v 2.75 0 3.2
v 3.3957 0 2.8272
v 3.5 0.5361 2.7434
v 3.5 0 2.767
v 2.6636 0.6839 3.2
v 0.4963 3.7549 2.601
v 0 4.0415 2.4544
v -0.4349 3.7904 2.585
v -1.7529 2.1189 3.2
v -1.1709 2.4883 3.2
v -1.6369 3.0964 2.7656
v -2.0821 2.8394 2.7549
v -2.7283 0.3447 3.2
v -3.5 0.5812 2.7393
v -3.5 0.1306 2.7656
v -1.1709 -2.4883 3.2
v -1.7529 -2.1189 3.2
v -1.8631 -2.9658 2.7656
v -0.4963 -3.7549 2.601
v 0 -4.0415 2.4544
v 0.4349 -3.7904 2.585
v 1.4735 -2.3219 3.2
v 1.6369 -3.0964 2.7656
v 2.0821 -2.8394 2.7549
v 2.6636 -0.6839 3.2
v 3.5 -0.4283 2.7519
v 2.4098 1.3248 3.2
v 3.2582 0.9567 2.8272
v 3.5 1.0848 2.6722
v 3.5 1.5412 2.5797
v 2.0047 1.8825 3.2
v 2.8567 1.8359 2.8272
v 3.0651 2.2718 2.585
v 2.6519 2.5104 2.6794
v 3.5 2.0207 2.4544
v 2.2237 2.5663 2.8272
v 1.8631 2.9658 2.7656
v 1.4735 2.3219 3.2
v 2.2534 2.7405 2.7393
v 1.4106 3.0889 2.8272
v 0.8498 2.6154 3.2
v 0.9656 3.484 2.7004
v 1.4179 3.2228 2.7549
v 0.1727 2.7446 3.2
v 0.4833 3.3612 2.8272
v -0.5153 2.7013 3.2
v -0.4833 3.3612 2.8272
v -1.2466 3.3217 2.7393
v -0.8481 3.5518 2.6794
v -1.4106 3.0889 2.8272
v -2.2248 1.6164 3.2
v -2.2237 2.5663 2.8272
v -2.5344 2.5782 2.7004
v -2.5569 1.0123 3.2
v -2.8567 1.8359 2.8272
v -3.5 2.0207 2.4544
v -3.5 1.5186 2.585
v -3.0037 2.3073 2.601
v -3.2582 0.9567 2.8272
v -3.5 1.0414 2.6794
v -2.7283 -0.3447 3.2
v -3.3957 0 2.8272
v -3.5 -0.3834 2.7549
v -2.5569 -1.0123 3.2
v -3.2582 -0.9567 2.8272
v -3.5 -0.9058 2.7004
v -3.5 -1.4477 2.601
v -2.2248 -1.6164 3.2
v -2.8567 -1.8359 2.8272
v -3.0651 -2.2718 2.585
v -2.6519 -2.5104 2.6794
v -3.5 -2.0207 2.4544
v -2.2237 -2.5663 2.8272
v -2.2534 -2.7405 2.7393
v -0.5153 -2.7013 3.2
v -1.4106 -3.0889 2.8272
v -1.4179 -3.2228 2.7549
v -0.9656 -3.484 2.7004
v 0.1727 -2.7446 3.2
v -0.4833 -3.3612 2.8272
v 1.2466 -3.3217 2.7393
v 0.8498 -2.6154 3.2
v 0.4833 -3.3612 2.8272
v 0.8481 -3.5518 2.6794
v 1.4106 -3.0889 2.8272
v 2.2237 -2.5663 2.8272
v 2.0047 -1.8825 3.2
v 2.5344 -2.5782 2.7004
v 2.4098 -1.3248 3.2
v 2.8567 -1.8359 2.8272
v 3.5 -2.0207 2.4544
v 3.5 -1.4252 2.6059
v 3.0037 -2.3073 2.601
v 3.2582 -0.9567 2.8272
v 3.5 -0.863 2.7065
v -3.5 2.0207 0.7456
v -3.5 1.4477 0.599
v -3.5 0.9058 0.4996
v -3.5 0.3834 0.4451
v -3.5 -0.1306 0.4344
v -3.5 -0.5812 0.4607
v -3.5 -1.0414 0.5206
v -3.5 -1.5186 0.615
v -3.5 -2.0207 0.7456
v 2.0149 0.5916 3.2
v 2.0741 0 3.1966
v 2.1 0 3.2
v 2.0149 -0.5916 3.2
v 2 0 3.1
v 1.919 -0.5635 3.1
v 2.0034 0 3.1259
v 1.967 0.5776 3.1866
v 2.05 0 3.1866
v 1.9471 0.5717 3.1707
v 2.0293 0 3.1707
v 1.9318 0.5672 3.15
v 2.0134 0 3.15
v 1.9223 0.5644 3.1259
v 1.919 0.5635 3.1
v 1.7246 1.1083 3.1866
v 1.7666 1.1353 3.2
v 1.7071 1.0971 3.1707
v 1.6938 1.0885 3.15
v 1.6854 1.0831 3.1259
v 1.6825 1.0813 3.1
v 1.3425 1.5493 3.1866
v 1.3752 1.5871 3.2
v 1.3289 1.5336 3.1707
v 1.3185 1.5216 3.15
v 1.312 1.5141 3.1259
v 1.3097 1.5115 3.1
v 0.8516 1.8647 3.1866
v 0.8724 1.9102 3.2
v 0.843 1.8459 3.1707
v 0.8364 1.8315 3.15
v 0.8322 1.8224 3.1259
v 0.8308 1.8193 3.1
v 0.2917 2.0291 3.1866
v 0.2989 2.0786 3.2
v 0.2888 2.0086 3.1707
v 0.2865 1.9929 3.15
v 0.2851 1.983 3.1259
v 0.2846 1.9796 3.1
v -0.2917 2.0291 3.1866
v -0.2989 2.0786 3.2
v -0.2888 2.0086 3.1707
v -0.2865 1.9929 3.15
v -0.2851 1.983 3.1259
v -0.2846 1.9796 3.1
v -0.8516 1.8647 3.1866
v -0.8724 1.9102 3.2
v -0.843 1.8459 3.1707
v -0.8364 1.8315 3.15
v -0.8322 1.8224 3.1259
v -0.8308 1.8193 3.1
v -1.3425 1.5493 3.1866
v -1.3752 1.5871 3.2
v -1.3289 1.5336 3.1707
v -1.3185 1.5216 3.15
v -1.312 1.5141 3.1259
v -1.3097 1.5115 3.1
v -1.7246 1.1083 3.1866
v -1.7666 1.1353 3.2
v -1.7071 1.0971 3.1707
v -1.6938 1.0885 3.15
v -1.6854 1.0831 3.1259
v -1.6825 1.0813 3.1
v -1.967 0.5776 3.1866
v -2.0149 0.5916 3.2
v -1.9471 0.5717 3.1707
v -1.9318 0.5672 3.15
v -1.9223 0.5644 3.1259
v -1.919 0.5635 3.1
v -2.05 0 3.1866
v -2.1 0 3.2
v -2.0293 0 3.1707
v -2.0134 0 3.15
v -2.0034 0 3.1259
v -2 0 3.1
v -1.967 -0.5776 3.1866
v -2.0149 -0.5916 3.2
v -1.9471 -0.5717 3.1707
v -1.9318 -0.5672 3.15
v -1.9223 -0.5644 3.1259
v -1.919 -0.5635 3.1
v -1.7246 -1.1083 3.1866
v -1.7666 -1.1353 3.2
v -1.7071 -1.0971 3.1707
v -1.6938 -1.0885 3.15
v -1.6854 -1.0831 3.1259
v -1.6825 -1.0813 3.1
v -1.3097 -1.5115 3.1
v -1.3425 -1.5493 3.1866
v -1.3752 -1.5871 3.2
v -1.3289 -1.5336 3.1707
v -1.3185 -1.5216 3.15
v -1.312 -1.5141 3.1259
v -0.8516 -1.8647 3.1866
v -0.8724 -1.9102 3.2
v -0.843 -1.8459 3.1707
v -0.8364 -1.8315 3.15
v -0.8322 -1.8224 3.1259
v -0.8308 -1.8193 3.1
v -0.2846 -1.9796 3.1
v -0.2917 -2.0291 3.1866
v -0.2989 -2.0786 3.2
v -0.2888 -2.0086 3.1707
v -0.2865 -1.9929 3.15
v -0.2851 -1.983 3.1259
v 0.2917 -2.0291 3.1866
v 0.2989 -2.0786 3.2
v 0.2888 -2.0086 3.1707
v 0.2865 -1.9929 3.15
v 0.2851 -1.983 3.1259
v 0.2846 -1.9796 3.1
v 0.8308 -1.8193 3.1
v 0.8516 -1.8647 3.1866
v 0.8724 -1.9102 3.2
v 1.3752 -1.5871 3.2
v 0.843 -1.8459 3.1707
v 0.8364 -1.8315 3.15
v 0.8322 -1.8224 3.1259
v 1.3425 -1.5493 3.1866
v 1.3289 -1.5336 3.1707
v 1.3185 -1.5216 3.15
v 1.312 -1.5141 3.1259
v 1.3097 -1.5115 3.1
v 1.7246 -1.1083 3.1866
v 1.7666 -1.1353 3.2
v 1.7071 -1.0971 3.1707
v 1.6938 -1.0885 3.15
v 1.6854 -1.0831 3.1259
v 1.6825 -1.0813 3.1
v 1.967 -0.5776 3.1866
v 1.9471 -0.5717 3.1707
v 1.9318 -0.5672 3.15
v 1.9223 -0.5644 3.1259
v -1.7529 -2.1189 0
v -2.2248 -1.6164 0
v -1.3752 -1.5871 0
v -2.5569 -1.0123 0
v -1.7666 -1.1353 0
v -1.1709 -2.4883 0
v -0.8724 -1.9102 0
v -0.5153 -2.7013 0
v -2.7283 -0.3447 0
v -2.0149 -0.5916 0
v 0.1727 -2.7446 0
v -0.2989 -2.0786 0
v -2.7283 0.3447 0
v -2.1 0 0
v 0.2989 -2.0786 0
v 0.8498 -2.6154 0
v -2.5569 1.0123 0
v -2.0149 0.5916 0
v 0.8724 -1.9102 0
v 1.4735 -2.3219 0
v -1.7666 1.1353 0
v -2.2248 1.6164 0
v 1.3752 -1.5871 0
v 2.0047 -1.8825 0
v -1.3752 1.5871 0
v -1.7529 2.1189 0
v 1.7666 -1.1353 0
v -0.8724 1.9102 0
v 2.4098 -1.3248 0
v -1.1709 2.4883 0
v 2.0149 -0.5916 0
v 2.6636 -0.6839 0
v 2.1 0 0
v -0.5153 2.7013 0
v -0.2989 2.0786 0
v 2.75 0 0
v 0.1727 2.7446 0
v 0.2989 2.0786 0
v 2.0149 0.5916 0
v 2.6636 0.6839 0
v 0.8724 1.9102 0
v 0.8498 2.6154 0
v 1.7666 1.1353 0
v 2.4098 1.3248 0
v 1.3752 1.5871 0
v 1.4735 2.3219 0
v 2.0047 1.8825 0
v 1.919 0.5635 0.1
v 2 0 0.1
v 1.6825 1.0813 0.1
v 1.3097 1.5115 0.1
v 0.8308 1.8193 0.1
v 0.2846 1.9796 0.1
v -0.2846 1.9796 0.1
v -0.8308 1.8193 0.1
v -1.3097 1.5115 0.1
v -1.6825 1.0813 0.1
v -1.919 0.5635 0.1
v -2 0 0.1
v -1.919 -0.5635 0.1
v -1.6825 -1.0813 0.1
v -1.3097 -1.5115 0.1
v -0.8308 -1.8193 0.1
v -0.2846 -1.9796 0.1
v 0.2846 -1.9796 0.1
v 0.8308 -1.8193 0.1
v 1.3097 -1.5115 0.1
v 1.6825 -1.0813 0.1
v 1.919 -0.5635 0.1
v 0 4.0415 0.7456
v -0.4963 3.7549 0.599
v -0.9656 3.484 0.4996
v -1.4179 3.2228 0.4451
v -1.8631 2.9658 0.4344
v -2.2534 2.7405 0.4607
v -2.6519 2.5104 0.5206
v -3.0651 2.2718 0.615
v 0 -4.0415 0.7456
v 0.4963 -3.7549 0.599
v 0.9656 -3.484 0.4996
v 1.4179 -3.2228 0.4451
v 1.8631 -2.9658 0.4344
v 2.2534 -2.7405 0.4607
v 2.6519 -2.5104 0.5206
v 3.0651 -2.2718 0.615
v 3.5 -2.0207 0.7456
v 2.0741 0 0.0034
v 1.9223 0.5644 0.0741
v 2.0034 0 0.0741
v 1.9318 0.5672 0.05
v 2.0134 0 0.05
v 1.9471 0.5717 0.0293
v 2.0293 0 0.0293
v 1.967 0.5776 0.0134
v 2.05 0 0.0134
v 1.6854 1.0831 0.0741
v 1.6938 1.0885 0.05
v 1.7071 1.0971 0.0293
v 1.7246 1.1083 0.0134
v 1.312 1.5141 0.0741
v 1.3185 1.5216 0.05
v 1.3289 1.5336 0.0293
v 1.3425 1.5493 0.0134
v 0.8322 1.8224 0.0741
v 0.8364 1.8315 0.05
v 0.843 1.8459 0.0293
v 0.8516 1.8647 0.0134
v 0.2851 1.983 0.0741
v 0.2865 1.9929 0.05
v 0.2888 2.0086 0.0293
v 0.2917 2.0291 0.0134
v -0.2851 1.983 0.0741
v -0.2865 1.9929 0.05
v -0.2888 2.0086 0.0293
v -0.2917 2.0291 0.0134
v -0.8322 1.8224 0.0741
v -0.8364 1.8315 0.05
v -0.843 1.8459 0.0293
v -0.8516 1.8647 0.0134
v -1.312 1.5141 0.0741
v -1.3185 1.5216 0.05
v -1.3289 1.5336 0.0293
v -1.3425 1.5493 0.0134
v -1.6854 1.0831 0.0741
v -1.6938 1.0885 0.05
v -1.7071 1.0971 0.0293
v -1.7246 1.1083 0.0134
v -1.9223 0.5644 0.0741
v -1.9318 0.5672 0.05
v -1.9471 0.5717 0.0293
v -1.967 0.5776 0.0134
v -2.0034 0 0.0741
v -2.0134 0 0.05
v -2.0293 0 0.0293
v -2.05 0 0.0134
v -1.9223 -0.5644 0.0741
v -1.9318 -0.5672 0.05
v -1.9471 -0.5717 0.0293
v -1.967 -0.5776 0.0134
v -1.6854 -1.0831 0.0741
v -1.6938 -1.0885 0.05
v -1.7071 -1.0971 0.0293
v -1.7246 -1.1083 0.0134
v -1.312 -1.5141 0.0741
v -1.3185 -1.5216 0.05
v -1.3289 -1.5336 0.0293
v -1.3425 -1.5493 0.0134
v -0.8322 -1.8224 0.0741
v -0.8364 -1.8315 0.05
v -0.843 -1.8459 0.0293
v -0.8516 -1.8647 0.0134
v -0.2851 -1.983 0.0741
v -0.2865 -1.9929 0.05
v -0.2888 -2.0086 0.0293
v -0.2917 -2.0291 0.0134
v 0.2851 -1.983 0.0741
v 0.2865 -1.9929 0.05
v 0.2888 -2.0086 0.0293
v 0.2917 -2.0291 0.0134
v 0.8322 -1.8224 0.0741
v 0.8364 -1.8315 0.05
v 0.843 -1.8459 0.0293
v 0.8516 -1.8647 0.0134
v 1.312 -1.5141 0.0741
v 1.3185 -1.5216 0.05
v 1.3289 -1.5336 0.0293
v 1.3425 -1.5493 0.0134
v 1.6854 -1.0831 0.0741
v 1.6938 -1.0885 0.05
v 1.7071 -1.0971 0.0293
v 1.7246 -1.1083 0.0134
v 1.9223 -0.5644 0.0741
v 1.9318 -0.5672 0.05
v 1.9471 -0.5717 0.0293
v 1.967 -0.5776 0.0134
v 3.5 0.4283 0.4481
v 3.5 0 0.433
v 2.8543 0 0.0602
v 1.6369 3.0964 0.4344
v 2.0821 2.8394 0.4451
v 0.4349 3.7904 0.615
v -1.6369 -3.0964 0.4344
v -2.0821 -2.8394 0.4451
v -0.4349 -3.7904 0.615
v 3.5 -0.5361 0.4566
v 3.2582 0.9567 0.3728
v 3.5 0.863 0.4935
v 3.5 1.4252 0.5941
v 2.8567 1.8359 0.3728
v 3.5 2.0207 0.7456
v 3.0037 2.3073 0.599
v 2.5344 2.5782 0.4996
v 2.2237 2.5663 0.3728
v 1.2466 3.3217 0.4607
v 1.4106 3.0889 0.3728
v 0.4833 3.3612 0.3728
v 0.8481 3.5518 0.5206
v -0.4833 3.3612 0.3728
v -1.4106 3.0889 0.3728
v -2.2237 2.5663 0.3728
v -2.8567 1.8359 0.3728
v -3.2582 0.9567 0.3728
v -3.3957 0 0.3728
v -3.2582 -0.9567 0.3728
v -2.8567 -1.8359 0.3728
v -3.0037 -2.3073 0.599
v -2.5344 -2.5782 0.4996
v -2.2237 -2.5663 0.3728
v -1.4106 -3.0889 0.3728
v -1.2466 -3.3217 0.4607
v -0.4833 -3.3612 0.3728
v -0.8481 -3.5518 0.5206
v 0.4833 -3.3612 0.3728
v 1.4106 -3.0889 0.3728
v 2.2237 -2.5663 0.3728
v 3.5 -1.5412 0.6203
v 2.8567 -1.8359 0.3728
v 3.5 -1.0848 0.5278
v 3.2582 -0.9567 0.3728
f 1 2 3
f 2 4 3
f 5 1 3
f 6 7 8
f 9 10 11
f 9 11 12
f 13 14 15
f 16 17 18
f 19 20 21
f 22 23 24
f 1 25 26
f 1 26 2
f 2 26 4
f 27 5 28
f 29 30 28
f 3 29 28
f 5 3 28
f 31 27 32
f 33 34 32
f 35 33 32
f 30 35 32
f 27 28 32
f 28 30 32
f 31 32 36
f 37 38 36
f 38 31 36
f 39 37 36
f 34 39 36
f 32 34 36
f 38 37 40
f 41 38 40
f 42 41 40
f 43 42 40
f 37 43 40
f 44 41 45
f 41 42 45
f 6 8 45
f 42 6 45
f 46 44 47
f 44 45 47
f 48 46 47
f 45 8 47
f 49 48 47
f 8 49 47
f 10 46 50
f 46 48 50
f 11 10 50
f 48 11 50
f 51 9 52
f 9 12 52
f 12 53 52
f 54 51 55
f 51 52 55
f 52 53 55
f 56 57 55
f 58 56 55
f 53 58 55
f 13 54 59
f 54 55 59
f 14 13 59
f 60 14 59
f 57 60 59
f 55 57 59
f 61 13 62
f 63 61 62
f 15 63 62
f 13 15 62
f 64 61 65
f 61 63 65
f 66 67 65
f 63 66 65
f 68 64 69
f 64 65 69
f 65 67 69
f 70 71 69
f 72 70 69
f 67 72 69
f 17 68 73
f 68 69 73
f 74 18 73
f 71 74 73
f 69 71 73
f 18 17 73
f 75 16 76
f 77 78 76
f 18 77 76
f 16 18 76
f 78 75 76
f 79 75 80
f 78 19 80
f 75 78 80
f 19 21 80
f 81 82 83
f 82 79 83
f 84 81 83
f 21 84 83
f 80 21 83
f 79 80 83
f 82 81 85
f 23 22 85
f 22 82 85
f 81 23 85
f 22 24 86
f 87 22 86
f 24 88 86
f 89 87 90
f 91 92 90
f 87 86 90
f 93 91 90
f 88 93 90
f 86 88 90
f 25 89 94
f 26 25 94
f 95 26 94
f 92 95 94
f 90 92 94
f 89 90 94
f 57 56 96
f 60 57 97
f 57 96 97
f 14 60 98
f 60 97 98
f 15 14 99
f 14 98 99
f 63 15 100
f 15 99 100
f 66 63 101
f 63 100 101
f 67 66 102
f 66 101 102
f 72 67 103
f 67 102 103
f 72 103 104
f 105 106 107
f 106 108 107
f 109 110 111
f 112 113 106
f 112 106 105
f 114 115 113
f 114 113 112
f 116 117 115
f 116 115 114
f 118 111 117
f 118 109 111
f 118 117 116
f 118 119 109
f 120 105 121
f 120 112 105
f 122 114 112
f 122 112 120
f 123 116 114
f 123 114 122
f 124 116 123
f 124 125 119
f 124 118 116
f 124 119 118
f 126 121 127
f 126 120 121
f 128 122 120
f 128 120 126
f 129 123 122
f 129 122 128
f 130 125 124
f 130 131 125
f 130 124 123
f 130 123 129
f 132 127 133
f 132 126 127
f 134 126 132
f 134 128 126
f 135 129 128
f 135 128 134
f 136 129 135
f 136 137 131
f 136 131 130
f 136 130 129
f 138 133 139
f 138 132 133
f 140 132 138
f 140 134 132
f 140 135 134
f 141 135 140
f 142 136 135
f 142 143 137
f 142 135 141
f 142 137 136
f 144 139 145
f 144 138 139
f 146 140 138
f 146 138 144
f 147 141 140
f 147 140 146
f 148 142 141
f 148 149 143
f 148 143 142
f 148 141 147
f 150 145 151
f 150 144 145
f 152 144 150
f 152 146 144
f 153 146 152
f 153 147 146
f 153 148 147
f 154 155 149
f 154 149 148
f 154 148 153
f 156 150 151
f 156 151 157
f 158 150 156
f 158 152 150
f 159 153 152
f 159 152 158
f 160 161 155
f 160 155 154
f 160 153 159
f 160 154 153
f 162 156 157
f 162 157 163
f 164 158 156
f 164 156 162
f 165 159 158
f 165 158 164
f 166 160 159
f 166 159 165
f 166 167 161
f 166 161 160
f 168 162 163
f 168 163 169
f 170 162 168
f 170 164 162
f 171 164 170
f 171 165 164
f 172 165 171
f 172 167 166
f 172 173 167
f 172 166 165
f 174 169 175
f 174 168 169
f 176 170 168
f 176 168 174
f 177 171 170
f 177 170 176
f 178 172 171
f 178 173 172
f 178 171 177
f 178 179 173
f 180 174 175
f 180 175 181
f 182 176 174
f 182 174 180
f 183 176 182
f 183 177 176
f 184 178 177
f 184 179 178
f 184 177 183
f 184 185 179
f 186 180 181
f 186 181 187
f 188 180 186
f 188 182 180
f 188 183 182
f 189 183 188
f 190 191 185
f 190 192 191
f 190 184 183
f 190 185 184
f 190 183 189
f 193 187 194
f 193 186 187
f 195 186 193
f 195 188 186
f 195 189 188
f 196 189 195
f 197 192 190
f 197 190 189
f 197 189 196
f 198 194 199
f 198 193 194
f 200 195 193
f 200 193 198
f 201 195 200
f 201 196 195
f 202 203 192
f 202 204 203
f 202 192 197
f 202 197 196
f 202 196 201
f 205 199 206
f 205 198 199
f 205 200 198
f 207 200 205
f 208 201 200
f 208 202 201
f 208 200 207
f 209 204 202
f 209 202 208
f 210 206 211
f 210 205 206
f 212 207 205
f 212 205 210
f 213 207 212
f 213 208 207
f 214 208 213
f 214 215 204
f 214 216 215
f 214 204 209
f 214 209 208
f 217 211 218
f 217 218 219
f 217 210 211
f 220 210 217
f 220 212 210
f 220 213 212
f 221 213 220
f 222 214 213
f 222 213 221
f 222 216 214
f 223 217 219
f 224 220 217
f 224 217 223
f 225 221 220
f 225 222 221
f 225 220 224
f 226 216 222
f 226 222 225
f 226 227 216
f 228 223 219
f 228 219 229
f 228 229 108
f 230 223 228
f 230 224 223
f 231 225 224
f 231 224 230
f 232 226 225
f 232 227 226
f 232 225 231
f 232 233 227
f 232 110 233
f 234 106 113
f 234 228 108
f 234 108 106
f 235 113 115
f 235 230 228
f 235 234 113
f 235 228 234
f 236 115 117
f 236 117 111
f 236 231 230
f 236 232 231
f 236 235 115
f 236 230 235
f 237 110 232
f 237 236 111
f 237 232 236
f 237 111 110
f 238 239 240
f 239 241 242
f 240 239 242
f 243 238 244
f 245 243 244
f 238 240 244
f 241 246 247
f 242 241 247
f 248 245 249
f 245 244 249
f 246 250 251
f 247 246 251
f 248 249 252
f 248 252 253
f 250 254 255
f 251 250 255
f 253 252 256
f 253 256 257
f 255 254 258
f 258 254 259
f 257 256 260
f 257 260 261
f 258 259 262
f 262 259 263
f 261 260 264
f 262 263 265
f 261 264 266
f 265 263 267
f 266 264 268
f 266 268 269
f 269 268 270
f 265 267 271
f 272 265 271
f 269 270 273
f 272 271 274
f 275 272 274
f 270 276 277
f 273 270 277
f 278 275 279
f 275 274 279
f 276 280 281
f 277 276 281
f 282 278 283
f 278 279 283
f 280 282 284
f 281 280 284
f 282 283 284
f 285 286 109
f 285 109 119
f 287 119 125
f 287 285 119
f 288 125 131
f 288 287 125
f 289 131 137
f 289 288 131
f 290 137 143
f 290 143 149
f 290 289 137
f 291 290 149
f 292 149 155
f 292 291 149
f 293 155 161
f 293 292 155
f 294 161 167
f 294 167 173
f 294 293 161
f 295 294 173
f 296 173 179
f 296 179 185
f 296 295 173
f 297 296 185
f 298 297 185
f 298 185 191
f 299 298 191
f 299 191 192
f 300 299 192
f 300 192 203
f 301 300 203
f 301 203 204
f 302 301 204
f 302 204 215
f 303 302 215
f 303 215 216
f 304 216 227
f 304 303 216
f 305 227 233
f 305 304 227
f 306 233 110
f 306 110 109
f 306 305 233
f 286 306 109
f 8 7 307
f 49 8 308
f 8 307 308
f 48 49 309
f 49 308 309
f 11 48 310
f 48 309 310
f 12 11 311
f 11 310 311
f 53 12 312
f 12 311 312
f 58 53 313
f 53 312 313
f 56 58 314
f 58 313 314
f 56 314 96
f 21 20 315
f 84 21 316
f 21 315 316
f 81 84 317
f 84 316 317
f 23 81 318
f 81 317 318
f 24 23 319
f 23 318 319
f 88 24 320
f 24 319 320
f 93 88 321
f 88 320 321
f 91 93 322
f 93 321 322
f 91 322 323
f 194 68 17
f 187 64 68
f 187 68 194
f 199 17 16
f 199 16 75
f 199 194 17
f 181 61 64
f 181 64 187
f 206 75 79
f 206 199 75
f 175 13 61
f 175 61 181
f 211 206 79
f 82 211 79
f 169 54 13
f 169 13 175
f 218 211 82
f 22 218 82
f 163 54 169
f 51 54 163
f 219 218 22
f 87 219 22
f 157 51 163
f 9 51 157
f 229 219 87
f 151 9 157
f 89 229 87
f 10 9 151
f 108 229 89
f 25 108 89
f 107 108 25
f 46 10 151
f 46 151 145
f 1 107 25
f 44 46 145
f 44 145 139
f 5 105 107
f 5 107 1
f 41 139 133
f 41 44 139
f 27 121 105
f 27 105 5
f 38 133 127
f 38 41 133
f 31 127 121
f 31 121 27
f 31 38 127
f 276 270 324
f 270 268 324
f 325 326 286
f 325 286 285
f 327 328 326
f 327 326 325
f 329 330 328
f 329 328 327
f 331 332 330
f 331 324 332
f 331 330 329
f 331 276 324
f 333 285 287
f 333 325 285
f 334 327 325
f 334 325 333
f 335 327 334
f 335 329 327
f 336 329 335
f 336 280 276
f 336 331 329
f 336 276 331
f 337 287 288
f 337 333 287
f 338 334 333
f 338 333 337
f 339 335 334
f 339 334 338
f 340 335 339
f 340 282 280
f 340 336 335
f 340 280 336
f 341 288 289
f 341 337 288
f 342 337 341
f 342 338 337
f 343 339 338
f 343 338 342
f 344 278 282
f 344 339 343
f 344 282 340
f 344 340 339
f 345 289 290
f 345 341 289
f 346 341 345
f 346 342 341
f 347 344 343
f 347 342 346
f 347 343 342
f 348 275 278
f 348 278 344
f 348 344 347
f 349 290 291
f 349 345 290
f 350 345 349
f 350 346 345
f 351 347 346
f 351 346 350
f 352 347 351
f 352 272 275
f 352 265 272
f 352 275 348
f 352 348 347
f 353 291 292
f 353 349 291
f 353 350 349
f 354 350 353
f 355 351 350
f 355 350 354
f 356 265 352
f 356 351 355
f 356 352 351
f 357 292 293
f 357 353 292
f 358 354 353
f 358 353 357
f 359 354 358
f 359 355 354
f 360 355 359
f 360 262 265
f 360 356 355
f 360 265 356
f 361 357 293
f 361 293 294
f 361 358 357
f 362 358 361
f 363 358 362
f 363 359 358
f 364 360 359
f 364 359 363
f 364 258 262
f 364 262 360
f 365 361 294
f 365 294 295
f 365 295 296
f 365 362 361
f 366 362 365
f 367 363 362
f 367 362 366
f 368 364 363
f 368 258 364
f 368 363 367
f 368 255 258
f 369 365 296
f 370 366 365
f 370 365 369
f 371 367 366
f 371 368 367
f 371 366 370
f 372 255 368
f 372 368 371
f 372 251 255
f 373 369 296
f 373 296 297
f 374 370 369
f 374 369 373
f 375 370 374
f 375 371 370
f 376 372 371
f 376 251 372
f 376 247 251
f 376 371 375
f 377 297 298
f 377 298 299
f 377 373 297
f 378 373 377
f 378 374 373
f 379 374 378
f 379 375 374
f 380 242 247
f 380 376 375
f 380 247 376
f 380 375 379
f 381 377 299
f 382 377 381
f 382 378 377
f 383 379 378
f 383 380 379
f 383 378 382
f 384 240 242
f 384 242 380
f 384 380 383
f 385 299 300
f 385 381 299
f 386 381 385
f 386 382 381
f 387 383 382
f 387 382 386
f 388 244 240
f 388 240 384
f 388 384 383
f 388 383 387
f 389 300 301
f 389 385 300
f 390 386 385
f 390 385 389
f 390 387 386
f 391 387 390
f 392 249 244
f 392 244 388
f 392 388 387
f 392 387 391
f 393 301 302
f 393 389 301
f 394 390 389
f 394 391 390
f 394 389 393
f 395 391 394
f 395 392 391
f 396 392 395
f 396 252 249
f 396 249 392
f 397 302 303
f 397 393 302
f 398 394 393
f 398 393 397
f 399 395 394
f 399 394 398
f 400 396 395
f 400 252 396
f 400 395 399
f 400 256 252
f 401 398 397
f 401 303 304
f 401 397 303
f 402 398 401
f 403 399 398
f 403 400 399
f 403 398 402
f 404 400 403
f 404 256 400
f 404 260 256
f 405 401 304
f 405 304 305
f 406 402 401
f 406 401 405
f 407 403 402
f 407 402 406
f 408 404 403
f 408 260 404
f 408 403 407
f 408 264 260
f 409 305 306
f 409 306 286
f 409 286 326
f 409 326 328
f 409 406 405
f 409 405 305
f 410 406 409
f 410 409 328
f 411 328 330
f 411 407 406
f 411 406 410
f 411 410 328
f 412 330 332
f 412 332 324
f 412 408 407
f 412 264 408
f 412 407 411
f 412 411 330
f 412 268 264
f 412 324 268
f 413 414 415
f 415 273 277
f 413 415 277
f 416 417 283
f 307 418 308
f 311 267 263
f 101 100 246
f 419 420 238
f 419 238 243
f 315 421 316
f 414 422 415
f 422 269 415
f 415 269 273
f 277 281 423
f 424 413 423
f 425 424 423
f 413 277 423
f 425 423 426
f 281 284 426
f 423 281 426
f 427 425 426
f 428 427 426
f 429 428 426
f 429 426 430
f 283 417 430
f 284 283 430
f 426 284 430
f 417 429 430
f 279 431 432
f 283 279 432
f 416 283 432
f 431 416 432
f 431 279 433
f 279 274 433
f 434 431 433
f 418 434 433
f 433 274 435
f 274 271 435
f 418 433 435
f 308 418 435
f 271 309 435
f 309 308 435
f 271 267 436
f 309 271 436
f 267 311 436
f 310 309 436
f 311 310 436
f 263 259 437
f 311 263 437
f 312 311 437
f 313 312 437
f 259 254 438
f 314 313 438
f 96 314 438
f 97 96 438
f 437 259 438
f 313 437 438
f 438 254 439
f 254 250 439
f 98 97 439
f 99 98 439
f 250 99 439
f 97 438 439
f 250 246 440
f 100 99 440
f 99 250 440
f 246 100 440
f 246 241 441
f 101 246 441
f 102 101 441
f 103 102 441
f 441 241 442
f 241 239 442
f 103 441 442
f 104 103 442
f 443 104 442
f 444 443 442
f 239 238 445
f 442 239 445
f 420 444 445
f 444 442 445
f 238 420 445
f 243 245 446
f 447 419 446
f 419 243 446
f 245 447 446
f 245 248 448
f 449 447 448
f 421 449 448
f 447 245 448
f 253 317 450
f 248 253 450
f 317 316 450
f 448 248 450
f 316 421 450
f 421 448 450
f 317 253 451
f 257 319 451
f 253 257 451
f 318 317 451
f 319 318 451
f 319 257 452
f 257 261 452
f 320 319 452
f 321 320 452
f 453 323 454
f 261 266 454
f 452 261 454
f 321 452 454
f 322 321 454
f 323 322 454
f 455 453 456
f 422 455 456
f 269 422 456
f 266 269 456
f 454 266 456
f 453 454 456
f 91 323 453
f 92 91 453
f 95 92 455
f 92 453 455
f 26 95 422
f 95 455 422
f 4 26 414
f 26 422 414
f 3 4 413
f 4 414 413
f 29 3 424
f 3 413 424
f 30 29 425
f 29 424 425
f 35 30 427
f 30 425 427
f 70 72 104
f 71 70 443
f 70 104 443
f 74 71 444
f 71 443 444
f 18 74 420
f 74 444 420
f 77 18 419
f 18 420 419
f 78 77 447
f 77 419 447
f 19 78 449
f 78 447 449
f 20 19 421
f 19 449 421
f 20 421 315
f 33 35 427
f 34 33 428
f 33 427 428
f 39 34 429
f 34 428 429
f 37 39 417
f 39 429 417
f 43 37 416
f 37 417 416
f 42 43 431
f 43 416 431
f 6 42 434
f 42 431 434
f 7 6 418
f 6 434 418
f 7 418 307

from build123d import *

# Parameters (mm, degrees)
F0_R     = 2
F1_DEPTH = 3.2
F4_R     = 0.1
F5_R     = 0.1


with BuildPart() as f1:
    # F0 (on Top) → F1 (new body)
    with BuildSketch(Plane.XY):
        Polygon((-3.5, -2.020726), (0, -4.041452), (3.5, -2.020726), (3.5, 2.020726), (0, 4.041452), (-3.5, 2.020726), align=None)
        Circle(F0_R, mode=Mode.SUBTRACT)
    extrude(amount=F1_DEPTH)

    # F2 (on Front) → F3 (revolve, cut)
    with BuildSketch(Plane.XZ):
        Polygon((4.614809, 3.2), (3.5, 3.2), (4.614809, 2.556365), align=None)
        Polygon((4.614809, 2.556365), (3.5, 3.2), (2.75, 3.2), (4.614809, 2.123352), align=None)
        Polygon((5.364809, 3.2), (4.614809, 3.2), (4.614809, 2.556365), (5.364809, 2.123352), align=None)
        Polygon((4.614809, 0.643635), (3.5, 0), (4.614809, 0), align=None)
        Polygon((2.75, 0), (3.5, 0), (4.614809, 0.643635), (4.614809, 1.076648), align=None)
        Polygon((4.614809, 0.643635), (4.614809, 0), (5.364809, 0), (5.364809, 1.076648), align=None)
    revolve(axis=Axis((0, 0, 1.6), (0, 0, 1)), mode=Mode.SUBTRACT)

    # F4
    f4_edges = [f1.edges().sort_by_distance(p)[0] for p in [
        (-2, 0, 3.2),
    ]]
    fillet(f4_edges, radius=F4_R)

    # F5
    f5_edges = [f1.edges().sort_by_distance(p)[0] for p in [
        (-2, 0, 0),
    ]]
    fillet(f5_edges, radius=F5_R)


solid = f1.part
